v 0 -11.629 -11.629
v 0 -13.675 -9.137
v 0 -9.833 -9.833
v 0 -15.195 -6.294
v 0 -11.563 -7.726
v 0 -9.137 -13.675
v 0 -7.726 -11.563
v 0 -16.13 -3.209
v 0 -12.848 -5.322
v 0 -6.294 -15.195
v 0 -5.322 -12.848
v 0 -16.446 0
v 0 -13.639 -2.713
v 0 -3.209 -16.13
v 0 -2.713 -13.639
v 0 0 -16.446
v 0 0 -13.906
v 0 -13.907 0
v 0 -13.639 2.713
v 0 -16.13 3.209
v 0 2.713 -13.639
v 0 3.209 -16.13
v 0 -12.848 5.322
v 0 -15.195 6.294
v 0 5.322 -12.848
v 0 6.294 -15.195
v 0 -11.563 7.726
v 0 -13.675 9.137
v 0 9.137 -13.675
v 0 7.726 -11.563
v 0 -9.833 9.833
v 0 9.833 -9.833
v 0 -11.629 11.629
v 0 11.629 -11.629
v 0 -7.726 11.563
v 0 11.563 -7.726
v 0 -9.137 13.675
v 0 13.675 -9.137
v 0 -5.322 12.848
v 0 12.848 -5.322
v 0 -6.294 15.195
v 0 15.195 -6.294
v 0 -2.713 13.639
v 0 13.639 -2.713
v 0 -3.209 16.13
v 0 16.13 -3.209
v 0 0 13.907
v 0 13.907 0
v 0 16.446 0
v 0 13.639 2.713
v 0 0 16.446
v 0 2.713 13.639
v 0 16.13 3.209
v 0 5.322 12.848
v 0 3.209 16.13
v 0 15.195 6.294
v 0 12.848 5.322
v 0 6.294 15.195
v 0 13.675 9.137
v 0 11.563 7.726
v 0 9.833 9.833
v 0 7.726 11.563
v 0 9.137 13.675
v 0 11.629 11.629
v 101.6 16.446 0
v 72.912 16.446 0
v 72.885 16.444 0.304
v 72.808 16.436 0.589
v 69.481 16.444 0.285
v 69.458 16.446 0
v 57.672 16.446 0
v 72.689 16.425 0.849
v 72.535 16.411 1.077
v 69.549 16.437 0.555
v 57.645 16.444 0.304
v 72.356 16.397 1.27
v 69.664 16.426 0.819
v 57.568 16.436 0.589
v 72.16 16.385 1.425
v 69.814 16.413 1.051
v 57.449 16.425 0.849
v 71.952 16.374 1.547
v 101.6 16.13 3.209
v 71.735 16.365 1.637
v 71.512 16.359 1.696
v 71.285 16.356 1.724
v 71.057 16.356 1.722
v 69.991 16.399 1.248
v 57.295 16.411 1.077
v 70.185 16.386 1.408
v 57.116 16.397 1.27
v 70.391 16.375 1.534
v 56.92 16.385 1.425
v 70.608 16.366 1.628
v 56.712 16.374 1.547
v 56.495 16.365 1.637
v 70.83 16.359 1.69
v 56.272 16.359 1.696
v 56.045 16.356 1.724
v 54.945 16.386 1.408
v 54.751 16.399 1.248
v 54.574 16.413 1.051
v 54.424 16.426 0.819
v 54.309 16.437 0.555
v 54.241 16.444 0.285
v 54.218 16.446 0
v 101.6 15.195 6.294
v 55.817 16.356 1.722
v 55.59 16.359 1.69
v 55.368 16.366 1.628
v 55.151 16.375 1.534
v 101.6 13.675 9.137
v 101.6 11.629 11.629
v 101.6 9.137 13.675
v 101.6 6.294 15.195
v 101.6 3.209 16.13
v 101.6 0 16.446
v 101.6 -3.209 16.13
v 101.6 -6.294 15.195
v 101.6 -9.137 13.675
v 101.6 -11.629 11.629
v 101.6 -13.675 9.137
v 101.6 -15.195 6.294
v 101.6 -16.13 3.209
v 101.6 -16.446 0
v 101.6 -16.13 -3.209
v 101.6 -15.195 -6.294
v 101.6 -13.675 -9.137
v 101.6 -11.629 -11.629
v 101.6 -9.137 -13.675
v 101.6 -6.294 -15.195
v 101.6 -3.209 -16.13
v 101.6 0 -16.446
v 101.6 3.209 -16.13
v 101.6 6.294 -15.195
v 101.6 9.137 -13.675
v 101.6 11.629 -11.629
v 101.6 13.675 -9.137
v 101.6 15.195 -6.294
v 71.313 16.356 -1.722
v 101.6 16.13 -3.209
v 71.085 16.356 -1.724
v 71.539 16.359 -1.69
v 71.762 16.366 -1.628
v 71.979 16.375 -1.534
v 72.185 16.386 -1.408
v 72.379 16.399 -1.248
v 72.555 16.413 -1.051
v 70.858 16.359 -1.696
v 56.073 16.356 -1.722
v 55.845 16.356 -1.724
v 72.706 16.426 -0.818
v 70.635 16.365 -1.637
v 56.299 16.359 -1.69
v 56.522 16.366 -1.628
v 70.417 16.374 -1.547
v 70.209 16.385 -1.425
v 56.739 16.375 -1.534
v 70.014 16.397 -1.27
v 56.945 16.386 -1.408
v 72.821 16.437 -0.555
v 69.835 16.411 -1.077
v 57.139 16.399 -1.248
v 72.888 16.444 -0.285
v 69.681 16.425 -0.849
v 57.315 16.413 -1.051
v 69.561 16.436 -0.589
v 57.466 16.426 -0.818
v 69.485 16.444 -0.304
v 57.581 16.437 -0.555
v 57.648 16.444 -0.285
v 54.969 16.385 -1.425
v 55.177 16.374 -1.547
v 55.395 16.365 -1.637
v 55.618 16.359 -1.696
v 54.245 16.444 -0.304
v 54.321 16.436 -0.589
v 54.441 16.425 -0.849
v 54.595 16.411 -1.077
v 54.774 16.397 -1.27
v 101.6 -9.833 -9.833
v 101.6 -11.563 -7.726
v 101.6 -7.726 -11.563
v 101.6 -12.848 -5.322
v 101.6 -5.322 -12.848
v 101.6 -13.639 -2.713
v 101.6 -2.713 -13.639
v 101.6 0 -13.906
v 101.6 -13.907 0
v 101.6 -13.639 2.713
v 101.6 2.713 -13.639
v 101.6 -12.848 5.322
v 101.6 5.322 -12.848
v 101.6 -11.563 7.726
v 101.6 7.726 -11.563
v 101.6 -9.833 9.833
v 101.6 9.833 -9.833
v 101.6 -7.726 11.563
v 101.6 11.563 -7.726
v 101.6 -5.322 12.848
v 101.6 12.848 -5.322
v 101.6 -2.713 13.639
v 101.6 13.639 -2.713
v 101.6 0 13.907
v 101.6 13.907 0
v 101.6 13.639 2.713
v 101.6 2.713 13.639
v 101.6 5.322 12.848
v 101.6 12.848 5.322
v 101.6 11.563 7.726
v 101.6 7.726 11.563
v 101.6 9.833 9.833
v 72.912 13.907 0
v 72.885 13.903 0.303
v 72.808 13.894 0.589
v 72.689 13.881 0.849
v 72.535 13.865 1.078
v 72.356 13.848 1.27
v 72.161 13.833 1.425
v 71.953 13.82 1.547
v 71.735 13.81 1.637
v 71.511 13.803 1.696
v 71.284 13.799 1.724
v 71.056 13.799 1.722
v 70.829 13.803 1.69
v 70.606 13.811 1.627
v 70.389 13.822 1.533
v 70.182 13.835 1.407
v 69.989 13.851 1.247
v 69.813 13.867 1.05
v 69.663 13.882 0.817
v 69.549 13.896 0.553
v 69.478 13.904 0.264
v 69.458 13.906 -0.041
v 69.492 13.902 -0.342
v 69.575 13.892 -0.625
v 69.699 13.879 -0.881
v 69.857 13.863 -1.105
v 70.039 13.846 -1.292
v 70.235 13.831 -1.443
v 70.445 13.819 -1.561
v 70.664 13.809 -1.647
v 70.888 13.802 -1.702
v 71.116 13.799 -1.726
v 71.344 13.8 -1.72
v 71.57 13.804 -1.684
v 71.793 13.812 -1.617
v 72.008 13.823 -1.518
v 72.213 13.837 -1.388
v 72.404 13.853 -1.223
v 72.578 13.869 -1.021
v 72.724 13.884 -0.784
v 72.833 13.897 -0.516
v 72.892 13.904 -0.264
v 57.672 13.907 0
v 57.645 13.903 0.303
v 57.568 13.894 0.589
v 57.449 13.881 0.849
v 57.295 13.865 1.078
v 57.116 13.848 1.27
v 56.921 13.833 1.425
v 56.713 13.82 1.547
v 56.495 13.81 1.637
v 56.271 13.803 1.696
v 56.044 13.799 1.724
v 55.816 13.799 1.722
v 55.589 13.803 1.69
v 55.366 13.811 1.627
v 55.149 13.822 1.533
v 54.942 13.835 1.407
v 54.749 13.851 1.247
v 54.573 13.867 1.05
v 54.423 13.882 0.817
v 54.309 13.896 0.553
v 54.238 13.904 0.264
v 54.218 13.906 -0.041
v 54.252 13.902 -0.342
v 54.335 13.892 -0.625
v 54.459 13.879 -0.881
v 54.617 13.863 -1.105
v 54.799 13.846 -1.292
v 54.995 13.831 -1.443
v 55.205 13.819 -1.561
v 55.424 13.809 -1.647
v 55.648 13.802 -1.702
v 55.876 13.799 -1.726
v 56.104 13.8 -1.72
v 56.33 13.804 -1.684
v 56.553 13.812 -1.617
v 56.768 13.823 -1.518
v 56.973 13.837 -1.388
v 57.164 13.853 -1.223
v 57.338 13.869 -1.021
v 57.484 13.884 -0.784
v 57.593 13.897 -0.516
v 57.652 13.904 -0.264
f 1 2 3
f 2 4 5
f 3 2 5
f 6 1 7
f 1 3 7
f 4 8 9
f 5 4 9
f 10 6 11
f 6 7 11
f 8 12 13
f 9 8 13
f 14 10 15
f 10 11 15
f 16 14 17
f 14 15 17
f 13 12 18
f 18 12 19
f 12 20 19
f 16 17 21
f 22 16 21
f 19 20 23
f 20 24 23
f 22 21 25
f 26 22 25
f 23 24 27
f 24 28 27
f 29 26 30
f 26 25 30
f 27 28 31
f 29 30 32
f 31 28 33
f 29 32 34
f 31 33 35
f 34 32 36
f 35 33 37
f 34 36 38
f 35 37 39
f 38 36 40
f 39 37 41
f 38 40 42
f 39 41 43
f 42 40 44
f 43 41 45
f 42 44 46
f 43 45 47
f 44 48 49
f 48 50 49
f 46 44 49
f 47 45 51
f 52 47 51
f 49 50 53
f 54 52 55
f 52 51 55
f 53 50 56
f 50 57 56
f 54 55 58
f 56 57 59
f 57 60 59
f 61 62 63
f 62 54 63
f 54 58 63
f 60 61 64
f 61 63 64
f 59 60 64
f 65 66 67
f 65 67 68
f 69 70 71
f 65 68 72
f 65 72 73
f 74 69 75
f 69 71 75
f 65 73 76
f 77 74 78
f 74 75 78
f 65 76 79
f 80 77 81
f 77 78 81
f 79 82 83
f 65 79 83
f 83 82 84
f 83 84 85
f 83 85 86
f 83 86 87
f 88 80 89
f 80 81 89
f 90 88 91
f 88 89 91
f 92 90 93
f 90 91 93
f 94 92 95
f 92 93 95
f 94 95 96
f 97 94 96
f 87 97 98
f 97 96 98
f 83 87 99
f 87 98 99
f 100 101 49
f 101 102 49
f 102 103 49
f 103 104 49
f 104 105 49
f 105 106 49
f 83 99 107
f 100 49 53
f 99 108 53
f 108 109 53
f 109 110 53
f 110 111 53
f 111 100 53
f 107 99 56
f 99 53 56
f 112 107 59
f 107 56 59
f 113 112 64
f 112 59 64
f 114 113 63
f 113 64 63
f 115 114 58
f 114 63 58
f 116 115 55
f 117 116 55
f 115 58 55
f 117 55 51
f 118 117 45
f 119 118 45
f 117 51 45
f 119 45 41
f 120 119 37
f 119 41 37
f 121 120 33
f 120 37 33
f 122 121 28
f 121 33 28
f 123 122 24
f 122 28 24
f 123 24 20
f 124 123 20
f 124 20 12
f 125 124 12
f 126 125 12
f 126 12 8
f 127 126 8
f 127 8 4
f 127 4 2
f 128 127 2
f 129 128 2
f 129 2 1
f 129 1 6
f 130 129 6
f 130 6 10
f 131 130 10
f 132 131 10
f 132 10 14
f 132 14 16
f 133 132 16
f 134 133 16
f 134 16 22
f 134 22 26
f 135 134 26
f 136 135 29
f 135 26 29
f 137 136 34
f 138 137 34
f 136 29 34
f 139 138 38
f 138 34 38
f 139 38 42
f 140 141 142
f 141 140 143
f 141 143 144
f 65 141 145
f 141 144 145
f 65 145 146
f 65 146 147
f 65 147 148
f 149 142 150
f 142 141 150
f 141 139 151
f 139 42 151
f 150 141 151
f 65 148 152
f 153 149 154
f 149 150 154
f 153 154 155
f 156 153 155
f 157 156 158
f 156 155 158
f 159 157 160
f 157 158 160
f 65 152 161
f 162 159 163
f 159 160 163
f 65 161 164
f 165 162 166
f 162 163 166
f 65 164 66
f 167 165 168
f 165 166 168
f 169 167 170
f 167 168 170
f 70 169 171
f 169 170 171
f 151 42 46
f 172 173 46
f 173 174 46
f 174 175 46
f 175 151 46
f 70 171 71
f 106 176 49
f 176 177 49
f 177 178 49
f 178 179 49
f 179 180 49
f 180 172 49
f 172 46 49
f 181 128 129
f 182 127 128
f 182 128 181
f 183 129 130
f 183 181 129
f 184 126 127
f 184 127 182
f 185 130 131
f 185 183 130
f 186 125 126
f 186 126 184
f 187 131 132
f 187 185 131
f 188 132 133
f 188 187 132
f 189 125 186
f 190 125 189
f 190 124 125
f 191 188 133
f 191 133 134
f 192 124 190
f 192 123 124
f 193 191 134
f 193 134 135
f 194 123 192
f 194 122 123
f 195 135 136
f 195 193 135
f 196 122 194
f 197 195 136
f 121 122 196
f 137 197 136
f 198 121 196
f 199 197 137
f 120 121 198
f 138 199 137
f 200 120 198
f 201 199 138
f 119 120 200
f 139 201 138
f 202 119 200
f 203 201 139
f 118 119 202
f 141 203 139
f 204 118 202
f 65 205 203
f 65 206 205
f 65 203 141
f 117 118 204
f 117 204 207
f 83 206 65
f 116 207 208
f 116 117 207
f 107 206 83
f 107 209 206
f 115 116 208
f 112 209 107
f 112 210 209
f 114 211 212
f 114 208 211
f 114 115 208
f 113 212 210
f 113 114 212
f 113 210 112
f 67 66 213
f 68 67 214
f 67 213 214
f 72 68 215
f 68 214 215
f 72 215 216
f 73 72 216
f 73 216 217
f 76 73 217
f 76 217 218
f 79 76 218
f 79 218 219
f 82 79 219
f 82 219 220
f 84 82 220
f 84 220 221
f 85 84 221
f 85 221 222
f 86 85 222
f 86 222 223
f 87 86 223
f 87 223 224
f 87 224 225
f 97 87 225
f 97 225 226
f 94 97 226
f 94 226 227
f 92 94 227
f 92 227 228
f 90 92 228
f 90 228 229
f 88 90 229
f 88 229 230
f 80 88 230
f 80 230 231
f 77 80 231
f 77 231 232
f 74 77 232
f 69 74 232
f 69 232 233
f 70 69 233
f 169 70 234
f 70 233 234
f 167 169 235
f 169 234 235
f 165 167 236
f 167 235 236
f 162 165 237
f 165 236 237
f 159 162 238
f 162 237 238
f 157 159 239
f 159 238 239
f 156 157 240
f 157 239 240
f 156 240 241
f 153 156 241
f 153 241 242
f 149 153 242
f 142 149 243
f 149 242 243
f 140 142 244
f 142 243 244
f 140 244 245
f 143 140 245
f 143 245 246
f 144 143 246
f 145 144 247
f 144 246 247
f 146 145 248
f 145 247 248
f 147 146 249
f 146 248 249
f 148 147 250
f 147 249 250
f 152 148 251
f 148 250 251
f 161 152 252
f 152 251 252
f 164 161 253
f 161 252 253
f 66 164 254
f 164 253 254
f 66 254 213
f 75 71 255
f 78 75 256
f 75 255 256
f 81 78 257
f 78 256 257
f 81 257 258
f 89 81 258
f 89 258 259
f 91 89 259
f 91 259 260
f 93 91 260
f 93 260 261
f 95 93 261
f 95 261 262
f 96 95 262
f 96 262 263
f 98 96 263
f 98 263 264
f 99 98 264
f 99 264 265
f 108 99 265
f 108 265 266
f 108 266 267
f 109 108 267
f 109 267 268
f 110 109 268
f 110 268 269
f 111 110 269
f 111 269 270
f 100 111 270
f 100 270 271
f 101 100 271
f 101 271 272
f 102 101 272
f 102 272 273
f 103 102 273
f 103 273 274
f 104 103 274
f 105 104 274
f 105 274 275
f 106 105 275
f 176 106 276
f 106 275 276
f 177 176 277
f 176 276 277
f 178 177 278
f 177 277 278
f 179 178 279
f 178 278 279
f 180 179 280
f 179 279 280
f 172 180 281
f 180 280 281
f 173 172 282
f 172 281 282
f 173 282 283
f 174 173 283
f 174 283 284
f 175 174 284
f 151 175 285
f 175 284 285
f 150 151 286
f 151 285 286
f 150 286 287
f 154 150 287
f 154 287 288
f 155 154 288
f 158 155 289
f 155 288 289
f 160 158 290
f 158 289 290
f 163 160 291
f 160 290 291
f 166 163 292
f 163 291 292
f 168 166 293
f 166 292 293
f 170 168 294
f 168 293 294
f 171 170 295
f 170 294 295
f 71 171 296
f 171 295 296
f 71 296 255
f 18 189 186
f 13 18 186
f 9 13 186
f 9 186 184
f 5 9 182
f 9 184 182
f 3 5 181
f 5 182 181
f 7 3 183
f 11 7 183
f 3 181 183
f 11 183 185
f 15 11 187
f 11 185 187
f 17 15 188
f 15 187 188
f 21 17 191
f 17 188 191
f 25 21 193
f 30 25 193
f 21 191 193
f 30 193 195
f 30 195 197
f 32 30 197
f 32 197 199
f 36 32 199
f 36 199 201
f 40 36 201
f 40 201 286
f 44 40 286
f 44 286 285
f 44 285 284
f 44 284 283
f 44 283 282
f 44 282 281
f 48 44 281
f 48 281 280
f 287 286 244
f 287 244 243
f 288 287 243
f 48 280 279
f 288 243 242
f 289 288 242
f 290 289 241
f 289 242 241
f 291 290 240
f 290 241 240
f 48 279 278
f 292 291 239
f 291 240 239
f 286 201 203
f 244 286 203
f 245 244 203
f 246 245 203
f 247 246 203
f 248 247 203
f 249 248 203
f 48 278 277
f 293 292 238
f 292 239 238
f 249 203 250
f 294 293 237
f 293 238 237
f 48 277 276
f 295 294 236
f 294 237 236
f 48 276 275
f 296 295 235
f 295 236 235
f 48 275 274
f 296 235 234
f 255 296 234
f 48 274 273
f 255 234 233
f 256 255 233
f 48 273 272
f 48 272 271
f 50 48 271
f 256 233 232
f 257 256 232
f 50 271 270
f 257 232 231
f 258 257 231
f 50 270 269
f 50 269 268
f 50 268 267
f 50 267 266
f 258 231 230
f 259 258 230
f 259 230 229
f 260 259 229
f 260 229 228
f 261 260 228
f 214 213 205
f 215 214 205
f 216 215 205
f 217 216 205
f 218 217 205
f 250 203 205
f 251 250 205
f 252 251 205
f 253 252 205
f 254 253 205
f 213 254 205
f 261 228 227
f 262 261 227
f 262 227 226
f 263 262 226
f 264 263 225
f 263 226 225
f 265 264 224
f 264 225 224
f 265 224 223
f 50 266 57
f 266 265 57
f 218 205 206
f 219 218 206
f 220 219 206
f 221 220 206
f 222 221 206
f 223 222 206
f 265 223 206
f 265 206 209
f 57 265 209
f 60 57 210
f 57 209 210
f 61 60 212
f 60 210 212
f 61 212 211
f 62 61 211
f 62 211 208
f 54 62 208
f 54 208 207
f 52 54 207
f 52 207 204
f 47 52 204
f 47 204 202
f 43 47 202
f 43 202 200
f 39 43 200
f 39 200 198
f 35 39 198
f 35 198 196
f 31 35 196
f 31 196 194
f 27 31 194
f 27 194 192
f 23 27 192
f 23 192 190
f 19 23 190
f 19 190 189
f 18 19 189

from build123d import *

# Parameters (mm, degrees)
F0_R     = 16.4465
F1_DEPTH = 101.6
F4_DEPTH = 101.601
F5_D     = 3.4544
F5_DEPTH = 16.4475
F6_D     = 3.4544
F6_DEPTH = 16.4475001


with BuildPart() as f1:
    # F0 (on Right) → F1 (new body)
    with BuildSketch(Plane.YZ):
        Circle(F0_R)
    extrude(amount=F1_DEPTH)

    # F2 (on face) → F4 (cut, through all)
    with BuildSketch(Plane.YZ.offset(101.6)):
        with BuildLine():
            ThreePointArc((13.9065, 0), (0, 13.9065), (-13.9065, 0))
            ThreePointArc((-13.9065, 0), (0, -13.9065), (13.9065, 0))
        make_face()
    extrude(amount=-F4_DEPTH, mode=Mode.SUBTRACT)

    # F5 (through all, one way)
    with BuildSketch(Plane.XZ):
        with Locations((71.1848556182, 0)):
            Circle(F5_D / 2)
    extrude(amount=-F5_DEPTH, mode=Mode.SUBTRACT)

    # F6 (through all, one way)
    with BuildSketch(Plane.XZ):
        with Locations((55.9448556182, 0)):
            Circle(F6_D / 2)
    extrude(amount=-F6_DEPTH, mode=Mode.SUBTRACT)


solid = f1.part
